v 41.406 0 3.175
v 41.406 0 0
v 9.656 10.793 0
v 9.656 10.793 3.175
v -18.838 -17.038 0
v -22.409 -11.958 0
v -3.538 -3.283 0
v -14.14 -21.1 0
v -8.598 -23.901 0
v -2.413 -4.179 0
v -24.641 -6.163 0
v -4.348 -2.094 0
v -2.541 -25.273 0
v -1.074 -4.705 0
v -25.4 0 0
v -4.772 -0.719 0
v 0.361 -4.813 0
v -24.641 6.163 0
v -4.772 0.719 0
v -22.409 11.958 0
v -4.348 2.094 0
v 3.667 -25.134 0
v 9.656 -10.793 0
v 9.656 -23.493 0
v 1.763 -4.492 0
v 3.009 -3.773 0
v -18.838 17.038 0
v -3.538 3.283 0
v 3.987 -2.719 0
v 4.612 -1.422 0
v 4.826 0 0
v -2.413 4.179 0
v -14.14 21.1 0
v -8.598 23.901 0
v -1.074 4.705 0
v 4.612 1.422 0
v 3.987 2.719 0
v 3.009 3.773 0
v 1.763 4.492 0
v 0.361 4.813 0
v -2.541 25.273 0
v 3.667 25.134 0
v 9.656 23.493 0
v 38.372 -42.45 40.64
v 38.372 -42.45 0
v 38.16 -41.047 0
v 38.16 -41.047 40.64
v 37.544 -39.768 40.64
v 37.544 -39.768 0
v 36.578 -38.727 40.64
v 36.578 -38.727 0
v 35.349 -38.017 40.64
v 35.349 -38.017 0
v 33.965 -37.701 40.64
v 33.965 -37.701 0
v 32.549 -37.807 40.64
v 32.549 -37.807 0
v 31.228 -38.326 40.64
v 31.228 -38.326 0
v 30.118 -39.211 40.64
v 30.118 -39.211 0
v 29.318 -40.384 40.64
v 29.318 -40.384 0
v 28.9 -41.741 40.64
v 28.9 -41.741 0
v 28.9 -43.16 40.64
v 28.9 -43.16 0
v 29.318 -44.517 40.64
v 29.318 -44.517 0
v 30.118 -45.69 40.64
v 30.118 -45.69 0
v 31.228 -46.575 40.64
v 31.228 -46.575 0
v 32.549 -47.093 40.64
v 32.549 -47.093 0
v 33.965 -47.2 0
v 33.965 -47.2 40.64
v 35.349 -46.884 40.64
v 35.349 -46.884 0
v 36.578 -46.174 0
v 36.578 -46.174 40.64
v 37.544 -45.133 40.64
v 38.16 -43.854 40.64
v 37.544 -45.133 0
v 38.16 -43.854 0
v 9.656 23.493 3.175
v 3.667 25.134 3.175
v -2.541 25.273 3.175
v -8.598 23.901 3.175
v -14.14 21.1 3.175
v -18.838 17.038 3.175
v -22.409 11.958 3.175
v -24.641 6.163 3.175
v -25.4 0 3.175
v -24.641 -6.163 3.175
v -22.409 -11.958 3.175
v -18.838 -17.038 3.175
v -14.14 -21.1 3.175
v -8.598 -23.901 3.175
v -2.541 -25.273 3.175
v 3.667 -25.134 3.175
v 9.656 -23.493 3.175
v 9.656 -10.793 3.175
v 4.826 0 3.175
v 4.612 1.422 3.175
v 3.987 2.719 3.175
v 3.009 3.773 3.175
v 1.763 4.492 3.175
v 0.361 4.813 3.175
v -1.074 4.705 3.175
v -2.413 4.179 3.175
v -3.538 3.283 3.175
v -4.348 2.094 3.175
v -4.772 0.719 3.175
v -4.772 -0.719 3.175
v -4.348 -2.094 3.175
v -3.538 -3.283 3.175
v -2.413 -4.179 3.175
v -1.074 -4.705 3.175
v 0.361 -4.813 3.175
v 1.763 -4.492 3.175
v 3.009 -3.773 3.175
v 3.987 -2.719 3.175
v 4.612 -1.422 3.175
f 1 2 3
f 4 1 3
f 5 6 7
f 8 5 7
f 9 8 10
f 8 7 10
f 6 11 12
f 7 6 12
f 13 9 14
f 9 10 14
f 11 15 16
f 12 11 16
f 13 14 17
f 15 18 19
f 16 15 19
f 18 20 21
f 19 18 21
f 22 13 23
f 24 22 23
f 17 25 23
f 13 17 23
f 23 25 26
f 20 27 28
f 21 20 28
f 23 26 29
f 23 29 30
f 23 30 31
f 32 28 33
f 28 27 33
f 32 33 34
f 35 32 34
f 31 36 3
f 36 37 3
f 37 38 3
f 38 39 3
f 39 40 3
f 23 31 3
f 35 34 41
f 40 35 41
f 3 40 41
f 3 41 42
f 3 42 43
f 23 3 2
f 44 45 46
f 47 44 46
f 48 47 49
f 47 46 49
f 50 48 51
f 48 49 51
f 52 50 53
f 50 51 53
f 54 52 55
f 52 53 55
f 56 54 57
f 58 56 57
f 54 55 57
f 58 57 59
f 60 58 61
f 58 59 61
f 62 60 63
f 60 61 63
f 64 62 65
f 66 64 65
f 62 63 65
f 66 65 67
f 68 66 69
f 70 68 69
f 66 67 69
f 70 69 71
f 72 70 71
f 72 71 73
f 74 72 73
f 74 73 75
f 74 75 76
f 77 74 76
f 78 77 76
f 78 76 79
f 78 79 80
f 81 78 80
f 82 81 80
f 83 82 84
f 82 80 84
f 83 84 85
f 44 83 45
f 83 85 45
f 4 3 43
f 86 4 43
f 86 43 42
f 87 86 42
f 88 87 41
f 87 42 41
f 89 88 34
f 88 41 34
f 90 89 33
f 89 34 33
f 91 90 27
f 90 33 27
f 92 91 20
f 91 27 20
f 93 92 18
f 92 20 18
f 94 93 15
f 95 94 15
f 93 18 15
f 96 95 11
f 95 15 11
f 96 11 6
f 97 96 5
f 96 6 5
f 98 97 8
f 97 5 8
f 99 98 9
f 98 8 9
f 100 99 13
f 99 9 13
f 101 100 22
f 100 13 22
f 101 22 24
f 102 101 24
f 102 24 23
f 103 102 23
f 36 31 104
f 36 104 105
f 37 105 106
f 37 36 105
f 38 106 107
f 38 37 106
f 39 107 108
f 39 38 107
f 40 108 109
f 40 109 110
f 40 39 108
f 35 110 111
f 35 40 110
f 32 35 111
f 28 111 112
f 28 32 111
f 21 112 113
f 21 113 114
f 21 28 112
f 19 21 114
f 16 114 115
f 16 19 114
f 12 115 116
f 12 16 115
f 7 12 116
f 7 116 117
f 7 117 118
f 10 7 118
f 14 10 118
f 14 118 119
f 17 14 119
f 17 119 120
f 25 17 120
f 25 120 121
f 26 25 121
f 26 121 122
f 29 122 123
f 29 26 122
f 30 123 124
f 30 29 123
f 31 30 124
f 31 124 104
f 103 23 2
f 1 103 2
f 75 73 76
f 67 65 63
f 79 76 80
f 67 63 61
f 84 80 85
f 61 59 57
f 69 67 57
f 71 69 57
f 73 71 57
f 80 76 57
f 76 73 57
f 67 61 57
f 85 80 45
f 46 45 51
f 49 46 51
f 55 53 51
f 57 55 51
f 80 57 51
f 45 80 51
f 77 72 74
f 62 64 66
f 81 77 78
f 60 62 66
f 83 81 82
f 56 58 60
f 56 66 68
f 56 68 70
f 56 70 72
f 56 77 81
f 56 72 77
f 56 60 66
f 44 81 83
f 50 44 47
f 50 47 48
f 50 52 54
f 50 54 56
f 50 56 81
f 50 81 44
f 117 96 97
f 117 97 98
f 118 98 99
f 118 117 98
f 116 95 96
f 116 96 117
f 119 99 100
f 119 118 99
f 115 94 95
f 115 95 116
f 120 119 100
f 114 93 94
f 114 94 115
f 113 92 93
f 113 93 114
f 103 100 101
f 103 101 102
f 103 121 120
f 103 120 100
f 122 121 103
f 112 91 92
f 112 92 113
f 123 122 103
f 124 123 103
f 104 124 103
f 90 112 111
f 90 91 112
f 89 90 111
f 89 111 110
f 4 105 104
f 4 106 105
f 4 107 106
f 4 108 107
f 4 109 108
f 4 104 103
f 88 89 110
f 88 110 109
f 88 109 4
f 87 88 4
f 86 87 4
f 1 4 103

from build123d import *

# Parameters (mm, degrees)
F0_R     = 4.826
F1_DEPTH = 3.175
F2_R     = 4.7625
F3_DEPTH = 40.64


with BuildPart() as f1:
    # F0 (on Top) → F1 (new body)
    with BuildSketch(Plane.XY):
        with BuildLine():
            Line((9.656452, 10.792827), (9.656452, 23.492827))
            ThreePointArc((9.656452, 23.492827), (-25.4, 0), (9.656452, -23.492827))
            Line((9.656452, -23.492827), (9.656452, -10.792827))
            Line((9.656452, -10.792827), (41.406452, 0))
            Line((41.406452, 0), (9.656452, 10.792827))
        make_face()
        Circle(F0_R, mode=Mode.SUBTRACT)
    extrude(amount=F1_DEPTH)


with BuildPart() as f3:
    # F2 (on Top) → F3 (new body)
    with BuildSketch(Plane.XY):
        with Locations((33.609118, -42.450391)):
            Circle(F2_R)
    extrude(amount=F3_DEPTH)


solid = Compound([f1.part, f3.part])
